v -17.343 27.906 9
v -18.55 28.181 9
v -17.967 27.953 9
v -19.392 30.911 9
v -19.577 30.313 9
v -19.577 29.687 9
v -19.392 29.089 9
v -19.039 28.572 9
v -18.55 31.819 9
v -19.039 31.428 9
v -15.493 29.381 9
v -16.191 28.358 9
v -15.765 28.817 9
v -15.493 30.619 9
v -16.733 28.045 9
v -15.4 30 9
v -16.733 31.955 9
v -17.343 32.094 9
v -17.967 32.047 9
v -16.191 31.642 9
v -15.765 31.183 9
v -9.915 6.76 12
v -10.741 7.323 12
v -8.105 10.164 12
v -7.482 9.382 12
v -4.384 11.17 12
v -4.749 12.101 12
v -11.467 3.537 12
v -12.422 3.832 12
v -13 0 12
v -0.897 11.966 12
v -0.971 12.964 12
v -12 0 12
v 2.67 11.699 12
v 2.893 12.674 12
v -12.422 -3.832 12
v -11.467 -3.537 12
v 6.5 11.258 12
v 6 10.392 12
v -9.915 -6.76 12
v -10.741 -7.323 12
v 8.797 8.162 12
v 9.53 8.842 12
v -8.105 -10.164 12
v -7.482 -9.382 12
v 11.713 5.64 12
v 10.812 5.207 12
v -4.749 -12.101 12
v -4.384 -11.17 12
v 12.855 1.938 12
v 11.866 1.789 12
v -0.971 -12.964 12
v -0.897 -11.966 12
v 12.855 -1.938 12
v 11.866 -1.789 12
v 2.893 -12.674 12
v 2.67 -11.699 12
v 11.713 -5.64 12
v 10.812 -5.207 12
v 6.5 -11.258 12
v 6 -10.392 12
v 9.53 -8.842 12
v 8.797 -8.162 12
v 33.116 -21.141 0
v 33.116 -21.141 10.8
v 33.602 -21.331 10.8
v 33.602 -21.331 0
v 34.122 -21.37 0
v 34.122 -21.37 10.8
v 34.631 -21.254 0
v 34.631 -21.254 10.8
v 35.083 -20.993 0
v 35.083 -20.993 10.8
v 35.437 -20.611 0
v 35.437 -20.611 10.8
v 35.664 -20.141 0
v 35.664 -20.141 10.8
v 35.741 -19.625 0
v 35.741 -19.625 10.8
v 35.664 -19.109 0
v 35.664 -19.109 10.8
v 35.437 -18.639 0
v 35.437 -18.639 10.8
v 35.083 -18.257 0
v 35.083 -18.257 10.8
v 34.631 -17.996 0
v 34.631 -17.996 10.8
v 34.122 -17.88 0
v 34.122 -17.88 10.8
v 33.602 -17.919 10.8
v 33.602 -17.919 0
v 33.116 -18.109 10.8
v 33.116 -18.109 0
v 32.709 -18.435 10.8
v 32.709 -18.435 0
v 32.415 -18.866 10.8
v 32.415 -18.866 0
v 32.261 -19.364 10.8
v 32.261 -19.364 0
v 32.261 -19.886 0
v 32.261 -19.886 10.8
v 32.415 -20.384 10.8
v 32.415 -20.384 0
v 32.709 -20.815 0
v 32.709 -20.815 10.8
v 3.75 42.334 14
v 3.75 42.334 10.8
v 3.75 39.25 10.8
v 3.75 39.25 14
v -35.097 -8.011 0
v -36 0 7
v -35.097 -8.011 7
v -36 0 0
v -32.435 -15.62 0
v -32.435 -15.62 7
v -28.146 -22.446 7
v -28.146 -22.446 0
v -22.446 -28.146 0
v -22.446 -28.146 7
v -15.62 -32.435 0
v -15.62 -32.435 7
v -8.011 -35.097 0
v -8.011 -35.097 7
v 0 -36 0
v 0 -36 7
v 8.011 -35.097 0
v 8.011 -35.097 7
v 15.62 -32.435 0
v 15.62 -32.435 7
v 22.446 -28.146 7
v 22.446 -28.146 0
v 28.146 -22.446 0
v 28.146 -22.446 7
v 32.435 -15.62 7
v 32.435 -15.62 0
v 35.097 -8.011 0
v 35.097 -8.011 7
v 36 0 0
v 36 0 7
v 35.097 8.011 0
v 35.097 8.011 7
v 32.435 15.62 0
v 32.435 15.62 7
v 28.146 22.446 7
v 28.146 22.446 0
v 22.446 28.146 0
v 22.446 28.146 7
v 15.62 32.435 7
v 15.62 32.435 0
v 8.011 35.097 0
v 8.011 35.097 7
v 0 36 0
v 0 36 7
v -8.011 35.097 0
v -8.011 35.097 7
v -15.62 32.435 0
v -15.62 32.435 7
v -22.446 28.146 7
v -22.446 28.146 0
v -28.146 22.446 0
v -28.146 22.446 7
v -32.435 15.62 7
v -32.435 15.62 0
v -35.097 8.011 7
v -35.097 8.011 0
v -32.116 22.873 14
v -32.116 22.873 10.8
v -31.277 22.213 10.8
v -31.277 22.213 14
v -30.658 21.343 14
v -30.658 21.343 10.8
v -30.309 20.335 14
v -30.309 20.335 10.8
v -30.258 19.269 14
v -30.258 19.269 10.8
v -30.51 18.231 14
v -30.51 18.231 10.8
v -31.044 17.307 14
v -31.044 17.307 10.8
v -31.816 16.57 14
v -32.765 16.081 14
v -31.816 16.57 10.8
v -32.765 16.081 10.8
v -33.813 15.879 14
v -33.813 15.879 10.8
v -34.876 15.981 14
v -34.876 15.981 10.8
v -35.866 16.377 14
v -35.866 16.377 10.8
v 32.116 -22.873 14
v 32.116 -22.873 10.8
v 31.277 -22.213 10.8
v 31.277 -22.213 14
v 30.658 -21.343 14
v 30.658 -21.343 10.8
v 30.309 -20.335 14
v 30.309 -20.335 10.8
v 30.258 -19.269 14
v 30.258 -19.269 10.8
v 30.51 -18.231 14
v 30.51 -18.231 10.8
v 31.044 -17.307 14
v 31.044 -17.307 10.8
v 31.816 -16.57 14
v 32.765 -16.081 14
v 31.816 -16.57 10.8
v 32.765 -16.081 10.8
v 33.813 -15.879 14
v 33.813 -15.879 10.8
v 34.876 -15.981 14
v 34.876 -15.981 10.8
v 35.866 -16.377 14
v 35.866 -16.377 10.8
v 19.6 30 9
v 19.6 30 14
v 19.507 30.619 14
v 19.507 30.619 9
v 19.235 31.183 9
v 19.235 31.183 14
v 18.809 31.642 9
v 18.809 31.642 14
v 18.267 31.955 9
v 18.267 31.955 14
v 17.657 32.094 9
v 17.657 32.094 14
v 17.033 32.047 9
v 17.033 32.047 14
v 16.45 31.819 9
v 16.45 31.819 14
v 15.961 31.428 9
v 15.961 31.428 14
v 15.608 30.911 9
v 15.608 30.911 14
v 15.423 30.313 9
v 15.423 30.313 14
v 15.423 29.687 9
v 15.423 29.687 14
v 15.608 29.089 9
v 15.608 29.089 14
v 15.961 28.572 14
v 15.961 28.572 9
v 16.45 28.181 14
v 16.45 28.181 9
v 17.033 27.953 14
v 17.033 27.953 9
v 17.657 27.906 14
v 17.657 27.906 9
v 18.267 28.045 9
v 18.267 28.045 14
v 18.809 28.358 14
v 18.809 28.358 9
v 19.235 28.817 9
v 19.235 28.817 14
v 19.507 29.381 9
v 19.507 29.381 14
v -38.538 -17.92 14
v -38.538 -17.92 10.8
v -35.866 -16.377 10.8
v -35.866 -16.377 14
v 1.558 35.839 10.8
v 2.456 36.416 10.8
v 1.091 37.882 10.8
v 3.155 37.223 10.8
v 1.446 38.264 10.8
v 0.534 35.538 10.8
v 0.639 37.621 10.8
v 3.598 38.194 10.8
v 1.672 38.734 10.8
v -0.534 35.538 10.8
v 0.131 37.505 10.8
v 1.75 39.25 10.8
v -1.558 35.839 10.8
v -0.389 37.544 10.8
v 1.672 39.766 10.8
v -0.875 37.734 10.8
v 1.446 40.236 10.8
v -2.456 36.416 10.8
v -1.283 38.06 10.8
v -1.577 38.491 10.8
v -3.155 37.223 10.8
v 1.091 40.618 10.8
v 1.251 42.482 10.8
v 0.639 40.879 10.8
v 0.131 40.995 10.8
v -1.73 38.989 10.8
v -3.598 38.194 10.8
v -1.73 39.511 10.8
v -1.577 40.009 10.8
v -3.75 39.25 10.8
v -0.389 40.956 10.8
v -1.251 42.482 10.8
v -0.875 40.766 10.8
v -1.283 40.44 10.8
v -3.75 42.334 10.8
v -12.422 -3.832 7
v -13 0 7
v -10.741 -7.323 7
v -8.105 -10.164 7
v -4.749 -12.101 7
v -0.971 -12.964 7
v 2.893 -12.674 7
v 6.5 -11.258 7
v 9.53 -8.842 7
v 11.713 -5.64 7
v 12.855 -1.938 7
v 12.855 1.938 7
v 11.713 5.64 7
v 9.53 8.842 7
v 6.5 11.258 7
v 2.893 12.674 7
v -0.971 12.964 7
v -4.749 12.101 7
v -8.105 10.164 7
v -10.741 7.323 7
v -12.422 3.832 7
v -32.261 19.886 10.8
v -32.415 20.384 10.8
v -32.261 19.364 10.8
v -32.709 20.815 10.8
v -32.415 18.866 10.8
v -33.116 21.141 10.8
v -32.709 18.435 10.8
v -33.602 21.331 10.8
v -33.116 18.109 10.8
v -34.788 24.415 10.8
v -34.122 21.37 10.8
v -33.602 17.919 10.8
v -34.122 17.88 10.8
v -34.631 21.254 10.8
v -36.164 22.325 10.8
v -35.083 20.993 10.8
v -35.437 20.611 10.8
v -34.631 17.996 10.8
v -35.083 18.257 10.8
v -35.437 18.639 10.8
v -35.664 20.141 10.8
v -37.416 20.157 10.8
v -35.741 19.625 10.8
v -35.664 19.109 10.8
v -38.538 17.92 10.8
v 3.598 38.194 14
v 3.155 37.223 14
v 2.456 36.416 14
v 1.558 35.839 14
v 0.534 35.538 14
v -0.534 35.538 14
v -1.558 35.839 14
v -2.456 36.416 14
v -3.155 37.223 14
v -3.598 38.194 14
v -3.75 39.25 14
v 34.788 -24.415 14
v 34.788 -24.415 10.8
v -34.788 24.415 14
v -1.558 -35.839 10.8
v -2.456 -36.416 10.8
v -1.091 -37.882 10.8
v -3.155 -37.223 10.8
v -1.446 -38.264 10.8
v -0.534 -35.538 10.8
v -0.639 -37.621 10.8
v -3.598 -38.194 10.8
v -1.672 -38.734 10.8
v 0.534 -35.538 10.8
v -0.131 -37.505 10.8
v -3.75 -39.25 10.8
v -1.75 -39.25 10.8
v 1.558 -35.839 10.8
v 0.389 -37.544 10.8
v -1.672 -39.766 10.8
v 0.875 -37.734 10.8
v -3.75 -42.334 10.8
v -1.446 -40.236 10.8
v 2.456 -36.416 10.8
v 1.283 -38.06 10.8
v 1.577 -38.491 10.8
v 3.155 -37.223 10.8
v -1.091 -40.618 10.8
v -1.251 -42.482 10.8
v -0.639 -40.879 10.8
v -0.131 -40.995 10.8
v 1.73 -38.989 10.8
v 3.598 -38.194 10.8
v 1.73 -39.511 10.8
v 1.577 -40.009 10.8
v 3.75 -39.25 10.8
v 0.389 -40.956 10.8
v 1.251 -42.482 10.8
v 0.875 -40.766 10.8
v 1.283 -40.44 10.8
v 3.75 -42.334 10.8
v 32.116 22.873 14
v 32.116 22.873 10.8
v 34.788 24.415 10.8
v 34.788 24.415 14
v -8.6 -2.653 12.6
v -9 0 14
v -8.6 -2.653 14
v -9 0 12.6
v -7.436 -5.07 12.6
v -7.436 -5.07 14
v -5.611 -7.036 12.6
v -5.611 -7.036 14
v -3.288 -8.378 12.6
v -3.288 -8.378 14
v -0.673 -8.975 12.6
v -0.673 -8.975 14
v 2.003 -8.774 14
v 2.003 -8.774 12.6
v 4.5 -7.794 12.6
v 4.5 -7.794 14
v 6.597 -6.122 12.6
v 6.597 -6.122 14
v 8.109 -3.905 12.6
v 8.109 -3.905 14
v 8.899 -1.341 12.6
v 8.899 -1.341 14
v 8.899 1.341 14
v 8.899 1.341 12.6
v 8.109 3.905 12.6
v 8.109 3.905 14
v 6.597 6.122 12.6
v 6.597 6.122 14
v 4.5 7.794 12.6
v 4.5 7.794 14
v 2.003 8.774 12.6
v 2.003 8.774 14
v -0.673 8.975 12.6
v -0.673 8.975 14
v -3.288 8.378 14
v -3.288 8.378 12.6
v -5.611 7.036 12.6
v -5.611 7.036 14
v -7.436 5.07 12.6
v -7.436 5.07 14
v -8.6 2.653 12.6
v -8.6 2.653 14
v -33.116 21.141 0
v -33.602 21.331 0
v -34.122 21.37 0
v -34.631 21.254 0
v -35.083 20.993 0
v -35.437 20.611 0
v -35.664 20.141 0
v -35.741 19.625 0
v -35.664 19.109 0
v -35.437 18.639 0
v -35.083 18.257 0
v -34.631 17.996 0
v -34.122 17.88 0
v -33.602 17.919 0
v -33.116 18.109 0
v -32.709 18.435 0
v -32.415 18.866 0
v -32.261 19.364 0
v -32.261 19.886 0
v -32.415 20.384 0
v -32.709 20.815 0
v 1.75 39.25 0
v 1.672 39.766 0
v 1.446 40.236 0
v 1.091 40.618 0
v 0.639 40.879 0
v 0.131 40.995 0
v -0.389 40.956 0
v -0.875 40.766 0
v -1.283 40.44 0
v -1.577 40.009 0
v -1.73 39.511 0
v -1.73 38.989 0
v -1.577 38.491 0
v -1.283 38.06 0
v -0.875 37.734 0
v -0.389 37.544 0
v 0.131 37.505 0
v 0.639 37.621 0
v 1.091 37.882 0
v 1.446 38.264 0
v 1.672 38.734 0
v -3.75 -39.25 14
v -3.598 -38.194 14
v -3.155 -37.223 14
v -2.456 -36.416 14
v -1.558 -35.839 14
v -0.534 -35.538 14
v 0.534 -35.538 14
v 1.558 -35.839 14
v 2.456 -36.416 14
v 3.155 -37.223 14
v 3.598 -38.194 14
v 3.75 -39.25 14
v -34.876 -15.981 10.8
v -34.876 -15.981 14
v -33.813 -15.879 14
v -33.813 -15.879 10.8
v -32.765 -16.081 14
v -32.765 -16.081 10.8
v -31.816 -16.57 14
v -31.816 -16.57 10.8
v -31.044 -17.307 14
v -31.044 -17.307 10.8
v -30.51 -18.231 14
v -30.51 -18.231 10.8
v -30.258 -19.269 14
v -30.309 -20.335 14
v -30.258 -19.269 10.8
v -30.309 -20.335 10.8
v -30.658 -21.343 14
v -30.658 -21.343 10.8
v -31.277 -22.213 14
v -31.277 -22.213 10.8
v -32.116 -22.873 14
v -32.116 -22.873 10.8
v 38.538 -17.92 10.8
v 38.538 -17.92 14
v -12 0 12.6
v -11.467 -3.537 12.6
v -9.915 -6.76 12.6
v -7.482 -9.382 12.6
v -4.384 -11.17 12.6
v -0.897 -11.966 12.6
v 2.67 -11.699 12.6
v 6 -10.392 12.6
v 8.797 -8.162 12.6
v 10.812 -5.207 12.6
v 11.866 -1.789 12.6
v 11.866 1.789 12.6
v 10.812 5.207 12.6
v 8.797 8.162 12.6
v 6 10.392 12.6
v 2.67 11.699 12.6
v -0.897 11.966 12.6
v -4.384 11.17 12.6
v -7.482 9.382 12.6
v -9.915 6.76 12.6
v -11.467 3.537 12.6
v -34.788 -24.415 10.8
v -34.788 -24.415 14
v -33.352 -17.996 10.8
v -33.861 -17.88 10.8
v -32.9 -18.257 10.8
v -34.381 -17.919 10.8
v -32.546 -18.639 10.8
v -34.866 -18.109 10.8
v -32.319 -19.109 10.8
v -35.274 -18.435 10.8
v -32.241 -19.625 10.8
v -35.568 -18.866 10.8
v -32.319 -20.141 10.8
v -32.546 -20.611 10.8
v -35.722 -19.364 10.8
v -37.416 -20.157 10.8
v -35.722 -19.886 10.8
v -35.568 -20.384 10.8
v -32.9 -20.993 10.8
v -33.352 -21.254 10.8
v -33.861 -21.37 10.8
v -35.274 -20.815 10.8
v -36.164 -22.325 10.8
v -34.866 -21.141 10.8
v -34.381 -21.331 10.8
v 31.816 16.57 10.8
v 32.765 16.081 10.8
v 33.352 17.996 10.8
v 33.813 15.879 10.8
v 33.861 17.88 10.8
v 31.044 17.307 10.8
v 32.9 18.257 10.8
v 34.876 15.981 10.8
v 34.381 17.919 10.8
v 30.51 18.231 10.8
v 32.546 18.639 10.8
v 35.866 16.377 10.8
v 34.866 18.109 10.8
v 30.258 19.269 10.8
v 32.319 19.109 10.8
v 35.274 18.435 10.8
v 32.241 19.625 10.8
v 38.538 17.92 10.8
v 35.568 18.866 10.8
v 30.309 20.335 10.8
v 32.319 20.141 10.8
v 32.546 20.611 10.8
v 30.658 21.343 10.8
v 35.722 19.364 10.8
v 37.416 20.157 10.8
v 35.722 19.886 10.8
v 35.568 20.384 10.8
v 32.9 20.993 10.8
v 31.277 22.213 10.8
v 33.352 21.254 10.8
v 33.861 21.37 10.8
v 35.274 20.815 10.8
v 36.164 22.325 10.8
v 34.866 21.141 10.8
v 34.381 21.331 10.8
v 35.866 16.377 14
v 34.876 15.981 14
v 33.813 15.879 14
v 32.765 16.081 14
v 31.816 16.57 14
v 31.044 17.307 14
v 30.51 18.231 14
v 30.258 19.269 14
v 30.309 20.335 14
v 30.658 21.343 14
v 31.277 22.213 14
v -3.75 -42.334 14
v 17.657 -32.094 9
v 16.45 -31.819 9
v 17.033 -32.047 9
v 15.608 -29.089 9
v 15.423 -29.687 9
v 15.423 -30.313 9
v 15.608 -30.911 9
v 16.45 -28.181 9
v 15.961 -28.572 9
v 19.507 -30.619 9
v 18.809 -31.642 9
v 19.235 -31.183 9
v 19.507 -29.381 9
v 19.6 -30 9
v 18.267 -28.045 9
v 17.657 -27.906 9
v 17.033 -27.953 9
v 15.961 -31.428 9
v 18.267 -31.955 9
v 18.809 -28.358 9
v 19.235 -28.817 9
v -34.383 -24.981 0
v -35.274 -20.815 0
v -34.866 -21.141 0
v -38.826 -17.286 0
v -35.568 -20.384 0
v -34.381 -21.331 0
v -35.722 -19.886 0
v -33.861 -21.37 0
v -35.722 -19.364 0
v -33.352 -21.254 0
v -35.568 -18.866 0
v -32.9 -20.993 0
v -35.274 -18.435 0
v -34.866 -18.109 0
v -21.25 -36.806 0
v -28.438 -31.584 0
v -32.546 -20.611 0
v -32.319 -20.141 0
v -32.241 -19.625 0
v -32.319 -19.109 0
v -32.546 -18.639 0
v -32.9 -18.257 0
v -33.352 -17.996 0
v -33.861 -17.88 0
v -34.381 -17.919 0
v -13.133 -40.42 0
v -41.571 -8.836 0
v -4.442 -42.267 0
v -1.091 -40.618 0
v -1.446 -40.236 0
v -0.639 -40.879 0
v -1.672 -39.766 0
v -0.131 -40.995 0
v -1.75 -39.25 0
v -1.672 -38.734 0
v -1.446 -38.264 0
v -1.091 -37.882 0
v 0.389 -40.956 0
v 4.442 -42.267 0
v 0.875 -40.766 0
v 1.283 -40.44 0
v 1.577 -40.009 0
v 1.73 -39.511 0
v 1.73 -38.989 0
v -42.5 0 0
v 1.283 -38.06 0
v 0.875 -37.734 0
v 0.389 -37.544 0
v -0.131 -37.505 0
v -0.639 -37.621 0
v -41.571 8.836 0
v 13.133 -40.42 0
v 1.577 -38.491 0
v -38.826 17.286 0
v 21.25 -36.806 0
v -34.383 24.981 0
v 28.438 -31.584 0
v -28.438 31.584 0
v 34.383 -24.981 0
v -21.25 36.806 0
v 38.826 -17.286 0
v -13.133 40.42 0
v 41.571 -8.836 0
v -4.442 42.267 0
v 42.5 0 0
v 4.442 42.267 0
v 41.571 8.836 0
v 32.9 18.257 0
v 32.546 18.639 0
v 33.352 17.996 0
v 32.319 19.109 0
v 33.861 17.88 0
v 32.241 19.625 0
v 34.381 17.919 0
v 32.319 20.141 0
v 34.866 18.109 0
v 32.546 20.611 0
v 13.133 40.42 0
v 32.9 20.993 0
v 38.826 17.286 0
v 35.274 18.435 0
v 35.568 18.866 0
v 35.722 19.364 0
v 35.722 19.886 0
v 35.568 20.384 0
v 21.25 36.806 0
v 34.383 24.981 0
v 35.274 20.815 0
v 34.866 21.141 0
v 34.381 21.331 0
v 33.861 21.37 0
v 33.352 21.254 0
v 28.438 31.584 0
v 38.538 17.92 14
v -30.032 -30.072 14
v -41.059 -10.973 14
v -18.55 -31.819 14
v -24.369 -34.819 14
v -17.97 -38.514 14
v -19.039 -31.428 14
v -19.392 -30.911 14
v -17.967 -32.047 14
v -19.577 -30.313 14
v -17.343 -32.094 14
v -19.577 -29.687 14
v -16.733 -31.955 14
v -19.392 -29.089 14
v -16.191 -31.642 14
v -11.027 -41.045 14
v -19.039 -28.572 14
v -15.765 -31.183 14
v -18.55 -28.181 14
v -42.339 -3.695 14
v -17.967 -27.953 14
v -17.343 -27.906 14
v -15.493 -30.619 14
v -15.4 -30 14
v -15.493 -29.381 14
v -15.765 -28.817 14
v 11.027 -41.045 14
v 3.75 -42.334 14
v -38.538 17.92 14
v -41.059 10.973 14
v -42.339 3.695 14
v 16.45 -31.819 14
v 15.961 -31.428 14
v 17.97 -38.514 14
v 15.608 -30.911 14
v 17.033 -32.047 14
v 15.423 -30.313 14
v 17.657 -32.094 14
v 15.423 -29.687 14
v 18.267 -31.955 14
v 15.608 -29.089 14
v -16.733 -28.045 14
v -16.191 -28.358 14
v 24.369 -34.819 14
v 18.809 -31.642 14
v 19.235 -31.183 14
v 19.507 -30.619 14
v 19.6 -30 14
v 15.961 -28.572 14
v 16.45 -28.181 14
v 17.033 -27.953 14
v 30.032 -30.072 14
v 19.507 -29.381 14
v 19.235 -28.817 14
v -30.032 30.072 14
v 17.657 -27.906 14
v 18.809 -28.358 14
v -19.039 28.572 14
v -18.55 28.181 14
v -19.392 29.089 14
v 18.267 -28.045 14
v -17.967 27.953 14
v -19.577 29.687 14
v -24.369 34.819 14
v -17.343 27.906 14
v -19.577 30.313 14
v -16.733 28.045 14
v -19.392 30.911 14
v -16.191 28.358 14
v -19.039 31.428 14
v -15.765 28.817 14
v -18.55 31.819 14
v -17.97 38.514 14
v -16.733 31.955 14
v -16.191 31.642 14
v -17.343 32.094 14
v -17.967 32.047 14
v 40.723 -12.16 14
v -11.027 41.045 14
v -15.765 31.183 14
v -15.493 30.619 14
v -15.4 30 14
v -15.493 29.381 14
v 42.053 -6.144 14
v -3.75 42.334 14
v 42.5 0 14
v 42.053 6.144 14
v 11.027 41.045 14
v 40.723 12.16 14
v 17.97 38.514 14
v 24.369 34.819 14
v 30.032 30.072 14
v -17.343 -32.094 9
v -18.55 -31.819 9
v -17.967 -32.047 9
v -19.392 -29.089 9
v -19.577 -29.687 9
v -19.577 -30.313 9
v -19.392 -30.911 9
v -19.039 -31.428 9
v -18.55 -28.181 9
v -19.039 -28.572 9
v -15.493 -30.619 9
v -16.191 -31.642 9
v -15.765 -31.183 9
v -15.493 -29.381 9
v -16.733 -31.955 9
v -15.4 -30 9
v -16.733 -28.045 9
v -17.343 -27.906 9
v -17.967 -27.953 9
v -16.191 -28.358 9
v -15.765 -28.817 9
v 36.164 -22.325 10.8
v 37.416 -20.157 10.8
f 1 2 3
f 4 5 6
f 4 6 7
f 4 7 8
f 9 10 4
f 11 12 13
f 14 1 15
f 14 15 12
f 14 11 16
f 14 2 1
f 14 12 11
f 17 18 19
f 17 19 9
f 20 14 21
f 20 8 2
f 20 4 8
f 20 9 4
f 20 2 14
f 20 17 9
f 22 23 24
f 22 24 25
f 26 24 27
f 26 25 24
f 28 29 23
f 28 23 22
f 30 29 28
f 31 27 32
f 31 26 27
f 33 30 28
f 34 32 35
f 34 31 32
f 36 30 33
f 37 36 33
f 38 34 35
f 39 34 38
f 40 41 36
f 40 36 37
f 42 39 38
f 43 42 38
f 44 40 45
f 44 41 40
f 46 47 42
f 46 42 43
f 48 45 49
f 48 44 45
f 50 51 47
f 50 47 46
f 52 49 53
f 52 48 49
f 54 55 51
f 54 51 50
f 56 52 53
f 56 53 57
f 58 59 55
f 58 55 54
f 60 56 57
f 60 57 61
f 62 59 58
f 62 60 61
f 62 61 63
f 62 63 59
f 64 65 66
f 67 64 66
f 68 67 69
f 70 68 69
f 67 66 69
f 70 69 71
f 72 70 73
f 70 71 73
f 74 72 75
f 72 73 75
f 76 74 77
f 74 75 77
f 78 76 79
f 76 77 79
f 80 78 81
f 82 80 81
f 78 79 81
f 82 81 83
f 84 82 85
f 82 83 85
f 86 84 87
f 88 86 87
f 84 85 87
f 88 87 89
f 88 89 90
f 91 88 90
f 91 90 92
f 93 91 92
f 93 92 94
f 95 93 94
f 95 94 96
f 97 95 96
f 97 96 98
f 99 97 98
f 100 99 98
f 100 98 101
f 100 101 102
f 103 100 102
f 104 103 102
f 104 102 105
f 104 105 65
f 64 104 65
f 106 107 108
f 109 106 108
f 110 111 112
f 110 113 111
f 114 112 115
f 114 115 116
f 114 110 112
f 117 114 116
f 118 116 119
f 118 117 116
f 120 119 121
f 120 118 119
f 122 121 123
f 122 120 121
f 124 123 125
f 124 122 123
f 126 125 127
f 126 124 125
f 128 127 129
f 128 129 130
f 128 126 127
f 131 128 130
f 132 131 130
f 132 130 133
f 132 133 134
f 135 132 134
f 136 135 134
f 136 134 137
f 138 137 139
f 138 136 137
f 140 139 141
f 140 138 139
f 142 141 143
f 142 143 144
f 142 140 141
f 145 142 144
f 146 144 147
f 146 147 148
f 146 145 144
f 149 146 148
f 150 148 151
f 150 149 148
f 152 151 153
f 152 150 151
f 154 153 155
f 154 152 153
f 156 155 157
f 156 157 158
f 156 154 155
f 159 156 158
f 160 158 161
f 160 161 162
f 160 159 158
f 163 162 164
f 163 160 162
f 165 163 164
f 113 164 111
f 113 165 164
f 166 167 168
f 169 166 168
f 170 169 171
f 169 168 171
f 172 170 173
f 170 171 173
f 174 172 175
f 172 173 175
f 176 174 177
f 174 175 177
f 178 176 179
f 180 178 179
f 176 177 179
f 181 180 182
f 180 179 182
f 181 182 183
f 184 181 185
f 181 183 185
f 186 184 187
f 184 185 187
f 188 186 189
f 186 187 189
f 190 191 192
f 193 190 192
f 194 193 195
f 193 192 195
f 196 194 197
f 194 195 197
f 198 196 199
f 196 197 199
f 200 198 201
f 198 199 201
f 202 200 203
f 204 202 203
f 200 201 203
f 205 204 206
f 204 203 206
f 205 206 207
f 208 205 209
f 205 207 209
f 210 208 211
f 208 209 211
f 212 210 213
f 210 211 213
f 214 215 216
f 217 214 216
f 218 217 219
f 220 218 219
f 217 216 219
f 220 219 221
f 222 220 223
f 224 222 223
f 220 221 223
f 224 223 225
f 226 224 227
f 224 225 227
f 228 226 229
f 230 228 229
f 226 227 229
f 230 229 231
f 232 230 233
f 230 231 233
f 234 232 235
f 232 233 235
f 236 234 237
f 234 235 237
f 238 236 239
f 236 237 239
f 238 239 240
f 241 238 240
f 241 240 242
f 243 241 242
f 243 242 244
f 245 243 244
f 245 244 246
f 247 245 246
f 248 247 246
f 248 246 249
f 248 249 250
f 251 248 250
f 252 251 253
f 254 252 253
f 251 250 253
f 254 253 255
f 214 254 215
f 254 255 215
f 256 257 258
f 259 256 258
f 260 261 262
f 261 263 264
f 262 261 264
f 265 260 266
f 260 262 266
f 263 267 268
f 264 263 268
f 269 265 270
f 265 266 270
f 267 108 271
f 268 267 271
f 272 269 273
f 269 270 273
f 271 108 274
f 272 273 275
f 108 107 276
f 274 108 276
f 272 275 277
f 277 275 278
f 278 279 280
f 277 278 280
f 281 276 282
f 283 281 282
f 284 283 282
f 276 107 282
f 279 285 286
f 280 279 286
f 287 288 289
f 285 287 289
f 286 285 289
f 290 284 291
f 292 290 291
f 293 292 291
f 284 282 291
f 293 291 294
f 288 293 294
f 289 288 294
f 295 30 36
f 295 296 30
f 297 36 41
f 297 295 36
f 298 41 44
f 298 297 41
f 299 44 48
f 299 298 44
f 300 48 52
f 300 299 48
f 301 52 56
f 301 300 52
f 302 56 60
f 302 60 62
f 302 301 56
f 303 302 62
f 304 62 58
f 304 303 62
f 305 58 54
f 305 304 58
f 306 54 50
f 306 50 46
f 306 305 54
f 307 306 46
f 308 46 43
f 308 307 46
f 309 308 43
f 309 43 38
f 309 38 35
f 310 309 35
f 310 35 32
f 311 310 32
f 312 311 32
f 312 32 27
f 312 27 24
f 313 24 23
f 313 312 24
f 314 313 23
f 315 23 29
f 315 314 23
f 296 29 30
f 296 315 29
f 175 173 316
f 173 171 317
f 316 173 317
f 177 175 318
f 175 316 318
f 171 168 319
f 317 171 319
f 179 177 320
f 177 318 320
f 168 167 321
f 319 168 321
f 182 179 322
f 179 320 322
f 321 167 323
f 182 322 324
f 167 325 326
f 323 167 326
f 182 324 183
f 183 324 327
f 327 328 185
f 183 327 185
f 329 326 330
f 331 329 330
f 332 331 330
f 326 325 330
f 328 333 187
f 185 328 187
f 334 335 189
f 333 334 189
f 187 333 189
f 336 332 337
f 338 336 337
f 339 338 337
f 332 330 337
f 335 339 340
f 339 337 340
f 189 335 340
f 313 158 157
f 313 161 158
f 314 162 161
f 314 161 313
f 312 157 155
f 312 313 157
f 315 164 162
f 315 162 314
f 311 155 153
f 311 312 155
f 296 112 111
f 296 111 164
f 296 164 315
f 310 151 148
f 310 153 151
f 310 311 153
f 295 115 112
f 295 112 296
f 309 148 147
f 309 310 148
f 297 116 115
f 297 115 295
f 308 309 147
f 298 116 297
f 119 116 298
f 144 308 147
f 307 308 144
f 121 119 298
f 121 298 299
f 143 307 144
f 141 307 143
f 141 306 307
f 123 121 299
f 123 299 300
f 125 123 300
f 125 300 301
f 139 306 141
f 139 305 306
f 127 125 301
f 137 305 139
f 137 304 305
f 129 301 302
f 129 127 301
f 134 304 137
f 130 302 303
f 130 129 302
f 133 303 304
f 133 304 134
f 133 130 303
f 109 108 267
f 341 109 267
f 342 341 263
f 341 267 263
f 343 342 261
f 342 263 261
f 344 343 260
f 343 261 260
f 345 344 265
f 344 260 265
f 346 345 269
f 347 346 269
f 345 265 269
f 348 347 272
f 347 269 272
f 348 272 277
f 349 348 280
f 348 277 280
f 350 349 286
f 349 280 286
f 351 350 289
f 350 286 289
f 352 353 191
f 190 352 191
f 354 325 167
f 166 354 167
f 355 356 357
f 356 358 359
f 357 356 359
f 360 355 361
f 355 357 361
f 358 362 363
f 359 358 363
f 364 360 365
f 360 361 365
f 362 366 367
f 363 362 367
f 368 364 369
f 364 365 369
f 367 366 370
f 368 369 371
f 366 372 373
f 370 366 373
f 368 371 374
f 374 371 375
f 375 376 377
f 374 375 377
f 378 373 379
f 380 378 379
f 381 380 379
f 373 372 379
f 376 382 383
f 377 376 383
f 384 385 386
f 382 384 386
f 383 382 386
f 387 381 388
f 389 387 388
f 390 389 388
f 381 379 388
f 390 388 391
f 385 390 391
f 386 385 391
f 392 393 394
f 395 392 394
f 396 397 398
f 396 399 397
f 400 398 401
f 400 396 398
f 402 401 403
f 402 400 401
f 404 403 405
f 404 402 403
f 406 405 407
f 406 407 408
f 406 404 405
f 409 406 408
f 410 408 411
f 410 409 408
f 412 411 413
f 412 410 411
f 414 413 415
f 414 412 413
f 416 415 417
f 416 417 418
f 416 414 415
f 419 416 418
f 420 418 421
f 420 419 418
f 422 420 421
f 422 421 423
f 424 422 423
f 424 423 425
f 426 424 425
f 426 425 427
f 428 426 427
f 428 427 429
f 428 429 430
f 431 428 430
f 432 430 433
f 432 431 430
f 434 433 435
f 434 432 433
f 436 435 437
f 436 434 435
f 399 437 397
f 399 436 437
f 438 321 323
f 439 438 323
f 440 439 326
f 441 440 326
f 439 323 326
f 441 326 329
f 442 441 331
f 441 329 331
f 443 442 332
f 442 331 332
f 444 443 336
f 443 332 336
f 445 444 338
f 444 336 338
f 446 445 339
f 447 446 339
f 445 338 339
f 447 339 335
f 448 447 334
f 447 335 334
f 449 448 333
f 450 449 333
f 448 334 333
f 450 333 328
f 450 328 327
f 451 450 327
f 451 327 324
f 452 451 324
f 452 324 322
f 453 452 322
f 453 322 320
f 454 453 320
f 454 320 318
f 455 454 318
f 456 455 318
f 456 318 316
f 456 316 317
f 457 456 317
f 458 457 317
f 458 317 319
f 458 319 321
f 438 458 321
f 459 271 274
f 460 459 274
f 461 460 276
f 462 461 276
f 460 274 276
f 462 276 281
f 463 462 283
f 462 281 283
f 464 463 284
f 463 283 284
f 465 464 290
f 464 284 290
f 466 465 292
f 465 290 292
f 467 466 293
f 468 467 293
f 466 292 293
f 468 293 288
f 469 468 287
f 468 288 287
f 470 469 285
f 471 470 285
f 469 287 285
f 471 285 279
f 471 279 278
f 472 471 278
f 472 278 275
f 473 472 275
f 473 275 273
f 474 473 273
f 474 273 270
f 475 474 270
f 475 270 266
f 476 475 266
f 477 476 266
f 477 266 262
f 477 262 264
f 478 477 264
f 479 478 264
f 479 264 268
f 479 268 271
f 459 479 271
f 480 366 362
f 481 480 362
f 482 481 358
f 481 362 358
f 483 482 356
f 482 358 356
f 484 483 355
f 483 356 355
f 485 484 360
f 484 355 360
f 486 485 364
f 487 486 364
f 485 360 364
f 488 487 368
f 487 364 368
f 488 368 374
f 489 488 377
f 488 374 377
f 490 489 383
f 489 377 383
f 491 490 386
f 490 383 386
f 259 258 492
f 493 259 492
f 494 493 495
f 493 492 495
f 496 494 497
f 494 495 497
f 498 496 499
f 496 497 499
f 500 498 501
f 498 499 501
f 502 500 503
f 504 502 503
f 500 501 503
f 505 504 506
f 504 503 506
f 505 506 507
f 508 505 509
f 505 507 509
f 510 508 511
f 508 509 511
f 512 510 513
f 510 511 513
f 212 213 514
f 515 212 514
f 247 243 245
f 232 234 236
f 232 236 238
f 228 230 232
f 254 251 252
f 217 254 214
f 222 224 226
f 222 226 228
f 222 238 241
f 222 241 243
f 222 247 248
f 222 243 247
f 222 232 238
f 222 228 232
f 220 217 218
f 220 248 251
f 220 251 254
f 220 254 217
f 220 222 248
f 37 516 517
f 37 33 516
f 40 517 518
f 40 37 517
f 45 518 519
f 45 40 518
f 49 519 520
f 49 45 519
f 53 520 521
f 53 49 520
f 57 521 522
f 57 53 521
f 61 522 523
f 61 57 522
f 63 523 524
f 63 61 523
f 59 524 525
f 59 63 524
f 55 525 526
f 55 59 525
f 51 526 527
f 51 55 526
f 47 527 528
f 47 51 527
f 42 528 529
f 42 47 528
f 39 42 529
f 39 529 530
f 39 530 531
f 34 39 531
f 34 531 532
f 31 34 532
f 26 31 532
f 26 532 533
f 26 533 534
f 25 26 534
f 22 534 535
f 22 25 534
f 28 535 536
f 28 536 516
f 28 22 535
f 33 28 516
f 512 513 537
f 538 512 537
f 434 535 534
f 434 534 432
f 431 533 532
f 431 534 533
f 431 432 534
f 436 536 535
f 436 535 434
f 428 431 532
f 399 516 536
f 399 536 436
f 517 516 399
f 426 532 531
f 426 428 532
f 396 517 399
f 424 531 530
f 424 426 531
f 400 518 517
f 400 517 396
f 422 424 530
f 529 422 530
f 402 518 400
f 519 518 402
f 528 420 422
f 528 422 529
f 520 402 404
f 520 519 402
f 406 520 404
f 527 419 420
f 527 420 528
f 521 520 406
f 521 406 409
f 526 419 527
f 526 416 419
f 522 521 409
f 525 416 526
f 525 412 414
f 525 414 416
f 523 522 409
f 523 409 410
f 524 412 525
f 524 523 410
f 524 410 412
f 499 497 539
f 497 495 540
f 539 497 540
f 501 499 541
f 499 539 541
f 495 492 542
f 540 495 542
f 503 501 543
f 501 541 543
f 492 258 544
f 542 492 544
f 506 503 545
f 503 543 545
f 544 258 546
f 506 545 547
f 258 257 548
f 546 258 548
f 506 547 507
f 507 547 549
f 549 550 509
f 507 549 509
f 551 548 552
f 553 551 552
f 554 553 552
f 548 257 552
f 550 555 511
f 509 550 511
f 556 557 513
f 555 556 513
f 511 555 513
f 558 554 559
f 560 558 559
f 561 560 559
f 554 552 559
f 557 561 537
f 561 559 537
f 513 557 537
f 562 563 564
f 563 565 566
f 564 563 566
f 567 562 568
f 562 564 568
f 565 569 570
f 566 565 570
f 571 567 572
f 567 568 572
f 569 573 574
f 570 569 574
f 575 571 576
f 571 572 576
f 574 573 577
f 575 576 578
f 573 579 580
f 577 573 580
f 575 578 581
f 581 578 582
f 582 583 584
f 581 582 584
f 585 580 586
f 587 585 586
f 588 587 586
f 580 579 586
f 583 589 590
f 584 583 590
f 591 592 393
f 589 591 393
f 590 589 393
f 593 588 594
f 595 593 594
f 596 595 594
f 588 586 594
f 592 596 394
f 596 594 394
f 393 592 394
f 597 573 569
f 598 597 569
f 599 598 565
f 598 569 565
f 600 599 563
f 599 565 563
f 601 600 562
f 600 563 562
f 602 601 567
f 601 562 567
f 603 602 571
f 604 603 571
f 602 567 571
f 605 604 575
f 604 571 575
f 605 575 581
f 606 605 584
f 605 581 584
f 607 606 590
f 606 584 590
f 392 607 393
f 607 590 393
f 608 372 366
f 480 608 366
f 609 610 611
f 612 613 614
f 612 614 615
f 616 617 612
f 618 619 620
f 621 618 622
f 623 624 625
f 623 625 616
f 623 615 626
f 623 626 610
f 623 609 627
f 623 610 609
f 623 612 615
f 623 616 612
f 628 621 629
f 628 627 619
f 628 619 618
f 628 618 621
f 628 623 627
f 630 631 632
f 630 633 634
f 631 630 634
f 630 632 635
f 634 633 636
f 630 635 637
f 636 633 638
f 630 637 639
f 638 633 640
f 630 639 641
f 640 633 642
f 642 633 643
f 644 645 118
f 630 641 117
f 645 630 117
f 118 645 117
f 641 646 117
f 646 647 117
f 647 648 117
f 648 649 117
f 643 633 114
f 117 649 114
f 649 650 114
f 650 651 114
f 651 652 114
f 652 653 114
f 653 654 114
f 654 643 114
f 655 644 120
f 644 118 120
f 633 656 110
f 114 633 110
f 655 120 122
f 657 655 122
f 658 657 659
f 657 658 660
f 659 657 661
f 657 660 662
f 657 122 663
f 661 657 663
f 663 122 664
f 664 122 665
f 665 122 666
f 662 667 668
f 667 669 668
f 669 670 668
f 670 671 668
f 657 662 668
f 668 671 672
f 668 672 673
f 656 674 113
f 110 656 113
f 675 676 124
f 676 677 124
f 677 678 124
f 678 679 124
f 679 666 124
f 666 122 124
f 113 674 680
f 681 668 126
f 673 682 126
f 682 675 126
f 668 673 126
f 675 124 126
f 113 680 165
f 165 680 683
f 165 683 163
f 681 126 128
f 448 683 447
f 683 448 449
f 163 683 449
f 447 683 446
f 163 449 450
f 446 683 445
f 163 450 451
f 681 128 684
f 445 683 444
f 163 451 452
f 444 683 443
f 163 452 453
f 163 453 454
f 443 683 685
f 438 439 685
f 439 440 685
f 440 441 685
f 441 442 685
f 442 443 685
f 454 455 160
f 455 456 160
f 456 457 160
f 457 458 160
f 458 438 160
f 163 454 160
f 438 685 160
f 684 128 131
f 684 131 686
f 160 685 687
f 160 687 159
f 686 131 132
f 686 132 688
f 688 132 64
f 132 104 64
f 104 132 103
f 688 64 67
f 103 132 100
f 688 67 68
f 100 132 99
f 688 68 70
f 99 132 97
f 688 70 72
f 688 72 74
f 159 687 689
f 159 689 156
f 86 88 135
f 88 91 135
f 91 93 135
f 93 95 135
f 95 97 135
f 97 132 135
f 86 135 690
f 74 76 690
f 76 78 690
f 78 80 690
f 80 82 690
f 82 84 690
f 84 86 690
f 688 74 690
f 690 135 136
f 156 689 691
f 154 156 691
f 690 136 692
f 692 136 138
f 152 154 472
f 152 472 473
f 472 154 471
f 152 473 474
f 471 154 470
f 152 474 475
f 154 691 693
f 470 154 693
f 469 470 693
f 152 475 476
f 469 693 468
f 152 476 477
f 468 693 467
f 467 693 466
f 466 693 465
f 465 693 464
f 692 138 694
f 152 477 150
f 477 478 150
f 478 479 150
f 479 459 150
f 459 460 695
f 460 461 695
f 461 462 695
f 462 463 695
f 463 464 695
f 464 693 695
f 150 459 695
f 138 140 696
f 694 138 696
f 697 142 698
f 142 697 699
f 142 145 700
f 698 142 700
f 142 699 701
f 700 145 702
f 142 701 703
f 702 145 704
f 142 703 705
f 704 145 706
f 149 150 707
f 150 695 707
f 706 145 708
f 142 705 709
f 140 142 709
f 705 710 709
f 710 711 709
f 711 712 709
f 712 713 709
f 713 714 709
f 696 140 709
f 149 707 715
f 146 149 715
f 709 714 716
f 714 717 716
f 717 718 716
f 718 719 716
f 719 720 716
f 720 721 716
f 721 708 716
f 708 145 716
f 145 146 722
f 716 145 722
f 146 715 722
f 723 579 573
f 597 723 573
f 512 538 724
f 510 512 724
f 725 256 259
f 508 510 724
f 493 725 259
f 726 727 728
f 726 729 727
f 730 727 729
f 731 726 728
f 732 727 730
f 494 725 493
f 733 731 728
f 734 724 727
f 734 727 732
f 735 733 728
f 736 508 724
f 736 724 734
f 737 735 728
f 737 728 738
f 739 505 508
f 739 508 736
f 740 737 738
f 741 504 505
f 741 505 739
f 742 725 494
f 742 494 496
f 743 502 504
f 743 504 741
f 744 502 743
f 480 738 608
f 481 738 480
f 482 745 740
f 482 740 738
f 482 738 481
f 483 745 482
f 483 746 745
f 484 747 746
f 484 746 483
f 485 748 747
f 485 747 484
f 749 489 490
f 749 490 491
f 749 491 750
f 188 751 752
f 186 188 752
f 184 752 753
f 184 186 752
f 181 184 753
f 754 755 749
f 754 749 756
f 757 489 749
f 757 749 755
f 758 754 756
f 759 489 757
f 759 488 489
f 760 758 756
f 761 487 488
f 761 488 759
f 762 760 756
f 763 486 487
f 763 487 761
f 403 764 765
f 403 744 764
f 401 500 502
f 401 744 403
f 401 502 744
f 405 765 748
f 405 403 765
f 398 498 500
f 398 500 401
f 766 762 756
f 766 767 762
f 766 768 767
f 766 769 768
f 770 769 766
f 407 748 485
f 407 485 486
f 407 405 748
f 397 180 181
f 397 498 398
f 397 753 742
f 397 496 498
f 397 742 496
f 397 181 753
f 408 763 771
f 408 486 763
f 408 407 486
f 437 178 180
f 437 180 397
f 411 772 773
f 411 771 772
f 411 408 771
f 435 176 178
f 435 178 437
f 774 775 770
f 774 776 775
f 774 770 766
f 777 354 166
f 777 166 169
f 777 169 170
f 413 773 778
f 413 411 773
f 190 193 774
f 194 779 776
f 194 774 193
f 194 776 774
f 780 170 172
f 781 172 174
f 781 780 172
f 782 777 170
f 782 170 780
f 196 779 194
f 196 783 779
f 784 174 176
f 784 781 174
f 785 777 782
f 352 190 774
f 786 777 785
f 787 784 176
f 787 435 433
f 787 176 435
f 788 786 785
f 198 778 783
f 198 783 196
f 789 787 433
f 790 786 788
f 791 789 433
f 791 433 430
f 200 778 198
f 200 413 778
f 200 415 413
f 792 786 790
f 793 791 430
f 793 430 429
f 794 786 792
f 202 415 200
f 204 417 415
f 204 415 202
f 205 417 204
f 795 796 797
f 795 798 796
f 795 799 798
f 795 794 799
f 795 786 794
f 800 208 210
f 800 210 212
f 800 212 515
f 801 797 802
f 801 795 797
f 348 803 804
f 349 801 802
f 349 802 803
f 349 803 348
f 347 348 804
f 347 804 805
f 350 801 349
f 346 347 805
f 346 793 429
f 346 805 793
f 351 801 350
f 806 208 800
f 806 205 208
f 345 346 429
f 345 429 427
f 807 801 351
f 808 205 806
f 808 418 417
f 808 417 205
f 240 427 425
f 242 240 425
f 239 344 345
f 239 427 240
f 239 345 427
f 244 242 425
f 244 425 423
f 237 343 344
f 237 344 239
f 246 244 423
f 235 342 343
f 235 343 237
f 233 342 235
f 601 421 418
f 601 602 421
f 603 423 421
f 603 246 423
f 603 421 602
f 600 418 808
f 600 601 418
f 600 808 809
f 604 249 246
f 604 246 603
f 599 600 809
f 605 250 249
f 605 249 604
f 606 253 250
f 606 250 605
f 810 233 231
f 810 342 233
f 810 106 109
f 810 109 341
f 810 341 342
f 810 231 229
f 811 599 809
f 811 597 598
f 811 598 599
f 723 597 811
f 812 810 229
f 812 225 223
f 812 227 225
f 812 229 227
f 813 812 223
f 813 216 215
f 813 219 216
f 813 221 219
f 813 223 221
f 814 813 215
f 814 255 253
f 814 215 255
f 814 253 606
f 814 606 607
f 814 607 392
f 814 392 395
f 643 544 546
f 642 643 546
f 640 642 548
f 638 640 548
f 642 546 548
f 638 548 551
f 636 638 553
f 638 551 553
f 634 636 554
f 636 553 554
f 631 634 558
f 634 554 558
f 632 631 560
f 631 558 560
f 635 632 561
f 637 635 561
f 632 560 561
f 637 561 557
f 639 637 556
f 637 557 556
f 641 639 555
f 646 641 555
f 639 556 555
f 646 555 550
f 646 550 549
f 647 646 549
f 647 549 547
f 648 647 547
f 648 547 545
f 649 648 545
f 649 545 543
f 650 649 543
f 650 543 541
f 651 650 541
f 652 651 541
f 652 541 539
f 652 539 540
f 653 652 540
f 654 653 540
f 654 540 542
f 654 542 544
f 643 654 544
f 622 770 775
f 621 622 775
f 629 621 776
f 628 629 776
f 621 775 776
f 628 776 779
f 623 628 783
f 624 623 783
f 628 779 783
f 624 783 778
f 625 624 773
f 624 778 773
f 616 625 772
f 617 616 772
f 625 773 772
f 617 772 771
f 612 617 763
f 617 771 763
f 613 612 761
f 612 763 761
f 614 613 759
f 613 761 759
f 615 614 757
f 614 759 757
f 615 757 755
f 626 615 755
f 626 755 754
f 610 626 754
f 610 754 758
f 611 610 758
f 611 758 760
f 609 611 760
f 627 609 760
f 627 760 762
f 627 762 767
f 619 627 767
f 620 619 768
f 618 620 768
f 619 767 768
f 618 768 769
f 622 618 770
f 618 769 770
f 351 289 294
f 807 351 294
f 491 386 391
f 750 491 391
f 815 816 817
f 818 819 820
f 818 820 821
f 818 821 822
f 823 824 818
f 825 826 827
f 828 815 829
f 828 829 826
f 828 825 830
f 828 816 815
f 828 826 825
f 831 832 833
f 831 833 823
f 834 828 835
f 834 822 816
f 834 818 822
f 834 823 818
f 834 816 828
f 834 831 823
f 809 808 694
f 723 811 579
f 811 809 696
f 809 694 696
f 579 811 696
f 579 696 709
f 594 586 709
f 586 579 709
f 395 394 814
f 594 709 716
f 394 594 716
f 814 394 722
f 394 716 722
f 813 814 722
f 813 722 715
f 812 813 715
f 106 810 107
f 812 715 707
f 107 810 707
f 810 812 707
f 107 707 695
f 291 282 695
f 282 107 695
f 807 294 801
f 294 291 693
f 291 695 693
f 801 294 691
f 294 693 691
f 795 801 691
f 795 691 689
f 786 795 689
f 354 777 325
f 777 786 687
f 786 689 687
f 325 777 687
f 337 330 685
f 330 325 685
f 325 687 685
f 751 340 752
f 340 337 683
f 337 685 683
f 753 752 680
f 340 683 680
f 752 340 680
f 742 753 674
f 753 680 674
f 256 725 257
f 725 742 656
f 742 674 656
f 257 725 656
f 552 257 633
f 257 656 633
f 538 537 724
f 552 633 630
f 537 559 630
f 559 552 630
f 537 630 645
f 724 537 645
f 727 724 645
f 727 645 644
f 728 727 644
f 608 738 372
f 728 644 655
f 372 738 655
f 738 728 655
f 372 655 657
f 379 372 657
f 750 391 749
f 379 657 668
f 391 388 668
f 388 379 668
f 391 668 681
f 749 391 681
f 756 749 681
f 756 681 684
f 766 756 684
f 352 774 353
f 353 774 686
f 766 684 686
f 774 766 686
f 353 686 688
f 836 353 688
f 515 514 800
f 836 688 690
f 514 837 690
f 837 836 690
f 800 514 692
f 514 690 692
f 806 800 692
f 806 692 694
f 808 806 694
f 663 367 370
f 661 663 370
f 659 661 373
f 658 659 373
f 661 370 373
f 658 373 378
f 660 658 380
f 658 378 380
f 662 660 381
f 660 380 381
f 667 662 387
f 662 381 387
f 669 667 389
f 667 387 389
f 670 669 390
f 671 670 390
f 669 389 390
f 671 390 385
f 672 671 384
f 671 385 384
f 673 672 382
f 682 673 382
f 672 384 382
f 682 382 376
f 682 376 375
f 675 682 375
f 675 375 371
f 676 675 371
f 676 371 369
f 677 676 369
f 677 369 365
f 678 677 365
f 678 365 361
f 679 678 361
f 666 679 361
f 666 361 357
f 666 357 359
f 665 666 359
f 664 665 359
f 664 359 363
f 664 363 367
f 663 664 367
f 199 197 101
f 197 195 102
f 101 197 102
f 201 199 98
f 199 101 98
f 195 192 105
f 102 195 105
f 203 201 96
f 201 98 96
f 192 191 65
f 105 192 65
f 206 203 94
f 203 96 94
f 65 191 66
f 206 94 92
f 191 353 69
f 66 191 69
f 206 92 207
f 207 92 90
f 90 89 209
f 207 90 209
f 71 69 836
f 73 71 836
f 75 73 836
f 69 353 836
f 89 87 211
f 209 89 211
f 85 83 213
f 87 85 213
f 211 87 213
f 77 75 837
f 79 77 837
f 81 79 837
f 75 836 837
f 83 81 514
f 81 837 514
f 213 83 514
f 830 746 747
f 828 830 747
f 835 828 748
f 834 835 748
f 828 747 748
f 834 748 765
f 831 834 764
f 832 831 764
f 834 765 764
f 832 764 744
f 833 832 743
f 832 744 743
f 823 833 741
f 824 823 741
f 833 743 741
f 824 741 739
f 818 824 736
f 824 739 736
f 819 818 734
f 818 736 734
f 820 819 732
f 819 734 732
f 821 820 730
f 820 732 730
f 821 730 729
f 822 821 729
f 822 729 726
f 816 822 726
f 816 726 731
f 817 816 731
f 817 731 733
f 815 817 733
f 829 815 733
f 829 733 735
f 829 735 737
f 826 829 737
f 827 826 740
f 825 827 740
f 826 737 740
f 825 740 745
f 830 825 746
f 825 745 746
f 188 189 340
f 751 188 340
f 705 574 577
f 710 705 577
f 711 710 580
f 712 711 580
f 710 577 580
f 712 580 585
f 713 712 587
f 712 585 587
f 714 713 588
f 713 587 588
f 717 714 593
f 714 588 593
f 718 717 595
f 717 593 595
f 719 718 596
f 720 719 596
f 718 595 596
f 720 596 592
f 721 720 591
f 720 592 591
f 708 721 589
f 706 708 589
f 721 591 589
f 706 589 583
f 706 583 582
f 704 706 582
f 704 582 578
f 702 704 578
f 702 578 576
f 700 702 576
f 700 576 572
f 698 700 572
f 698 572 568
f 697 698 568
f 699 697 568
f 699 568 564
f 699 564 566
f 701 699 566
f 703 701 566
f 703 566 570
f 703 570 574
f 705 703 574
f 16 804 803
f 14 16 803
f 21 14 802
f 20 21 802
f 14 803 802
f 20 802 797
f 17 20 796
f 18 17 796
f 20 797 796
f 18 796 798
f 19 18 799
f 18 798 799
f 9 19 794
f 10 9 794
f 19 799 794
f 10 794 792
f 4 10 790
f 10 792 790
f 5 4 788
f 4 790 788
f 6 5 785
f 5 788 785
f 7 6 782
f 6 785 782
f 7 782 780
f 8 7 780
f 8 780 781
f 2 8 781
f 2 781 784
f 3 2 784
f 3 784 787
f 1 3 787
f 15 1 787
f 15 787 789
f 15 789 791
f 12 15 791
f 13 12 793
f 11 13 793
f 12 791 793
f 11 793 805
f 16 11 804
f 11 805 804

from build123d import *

# Parameters (mm, degrees)
ESBO_O1_R                = 42.5
RESSALTO_EXTRUS_O1_DEPTH = 14
CORTE_EXTRUS_O1_START    = -3.2
CORTE_EXTRUS_O1_DEPTH    = 3.2
ESBO_O5_R                = 1.75
CORTE_EXTRUS_O2_DEPTH    = 62.066684862
PADR_OCIRCULAR1_COUNT    = 6
ESBO_O6_R                = 2.1
CORTE_EXTRUS_O3_DEPTH    = 5


with BuildPart() as part:
    # Esboço1 → Ressalto-extrusão1 (new body)
    with BuildSketch(Plane.XY):
        Circle(ESBO_O1_R)
    extrude(amount=RESSALTO_EXTRUS_O1_DEPTH)

    # Esboço3 → Corte-Revolução1 (revolve, cut)
    with BuildSketch(Plane(origin=(0, 0, 0), x_dir=(1, 0, 0), z_dir=(0, 1, 0))):
        Polygon((0, 0), (0, -14), (-9, -14), (-9, -12.6), (-12, -12.6), (-12, -12), (-13, -12), (-13, -7), (-36, -7), (-36, 0), align=None)
    revolve(axis=Axis((0, 0, 0), (0, 0, 1)), mode=Mode.SUBTRACT)

    # Esboço4 → Corte-extrusão1 (cut)
    with BuildSketch(Plane.XY.offset(14).offset(CORTE_EXTRUS_O1_START)):
        with BuildLine():
            Line((-3.75, 39.25), (-3.75, 42.334235555))
            ThreePointArc((-3.75, 42.334235555), (0, 42.5), (3.75, 42.334235555))
            Line((3.75, 42.334235555), (3.75, 39.25))
            ThreePointArc((3.75, 39.25), (0, 35.5), (-3.75, 39.25))
        make_face()
    corte_extrus_o1 = extrude(amount=CORTE_EXTRUS_O1_DEPTH, mode=Mode.SUBTRACT)

    # Esboço5 → Corte-extrusão2 (cut, through all)
    with BuildSketch(Plane.XY.offset(10.8)):
        with Locations((0, 39.25)):
            Circle(ESBO_O5_R)
    corte_extrus_o2 = extrude(amount=-CORTE_EXTRUS_O2_DEPTH, mode=Mode.SUBTRACT)

    # PadrãoCircular1: Corte-extrusão1, Corte-extrusão2 ×6 about axis
    padr_ocircular1_axis = Axis((0, 0, 0), (0, 0, 1))
    add([corte_extrus_o1.rotate(padr_ocircular1_axis, i * 360 / PADR_OCIRCULAR1_COUNT) for i in range(1, PADR_OCIRCULAR1_COUNT)], mode=Mode.SUBTRACT)
    add([corte_extrus_o2.rotate(padr_ocircular1_axis, i * 360 / PADR_OCIRCULAR1_COUNT) for i in range(1, PADR_OCIRCULAR1_COUNT)], mode=Mode.SUBTRACT)

    # Esboço6 → Corte-extrusão3 (cut)
    with BuildSketch(Plane.XY.offset(14)):
        with Locations((-17.5, 30)):
            Circle(ESBO_O6_R)
        with Locations((17.5, 30)):
            Circle(ESBO_O6_R)
        with Locations((17.5, -30)):
            Circle(ESBO_O6_R)
        with Locations((-17.5, -30)):
            Circle(ESBO_O6_R)
    extrude(amount=-CORTE_EXTRUS_O3_DEPTH, mode=Mode.SUBTRACT)


solid = part.part
